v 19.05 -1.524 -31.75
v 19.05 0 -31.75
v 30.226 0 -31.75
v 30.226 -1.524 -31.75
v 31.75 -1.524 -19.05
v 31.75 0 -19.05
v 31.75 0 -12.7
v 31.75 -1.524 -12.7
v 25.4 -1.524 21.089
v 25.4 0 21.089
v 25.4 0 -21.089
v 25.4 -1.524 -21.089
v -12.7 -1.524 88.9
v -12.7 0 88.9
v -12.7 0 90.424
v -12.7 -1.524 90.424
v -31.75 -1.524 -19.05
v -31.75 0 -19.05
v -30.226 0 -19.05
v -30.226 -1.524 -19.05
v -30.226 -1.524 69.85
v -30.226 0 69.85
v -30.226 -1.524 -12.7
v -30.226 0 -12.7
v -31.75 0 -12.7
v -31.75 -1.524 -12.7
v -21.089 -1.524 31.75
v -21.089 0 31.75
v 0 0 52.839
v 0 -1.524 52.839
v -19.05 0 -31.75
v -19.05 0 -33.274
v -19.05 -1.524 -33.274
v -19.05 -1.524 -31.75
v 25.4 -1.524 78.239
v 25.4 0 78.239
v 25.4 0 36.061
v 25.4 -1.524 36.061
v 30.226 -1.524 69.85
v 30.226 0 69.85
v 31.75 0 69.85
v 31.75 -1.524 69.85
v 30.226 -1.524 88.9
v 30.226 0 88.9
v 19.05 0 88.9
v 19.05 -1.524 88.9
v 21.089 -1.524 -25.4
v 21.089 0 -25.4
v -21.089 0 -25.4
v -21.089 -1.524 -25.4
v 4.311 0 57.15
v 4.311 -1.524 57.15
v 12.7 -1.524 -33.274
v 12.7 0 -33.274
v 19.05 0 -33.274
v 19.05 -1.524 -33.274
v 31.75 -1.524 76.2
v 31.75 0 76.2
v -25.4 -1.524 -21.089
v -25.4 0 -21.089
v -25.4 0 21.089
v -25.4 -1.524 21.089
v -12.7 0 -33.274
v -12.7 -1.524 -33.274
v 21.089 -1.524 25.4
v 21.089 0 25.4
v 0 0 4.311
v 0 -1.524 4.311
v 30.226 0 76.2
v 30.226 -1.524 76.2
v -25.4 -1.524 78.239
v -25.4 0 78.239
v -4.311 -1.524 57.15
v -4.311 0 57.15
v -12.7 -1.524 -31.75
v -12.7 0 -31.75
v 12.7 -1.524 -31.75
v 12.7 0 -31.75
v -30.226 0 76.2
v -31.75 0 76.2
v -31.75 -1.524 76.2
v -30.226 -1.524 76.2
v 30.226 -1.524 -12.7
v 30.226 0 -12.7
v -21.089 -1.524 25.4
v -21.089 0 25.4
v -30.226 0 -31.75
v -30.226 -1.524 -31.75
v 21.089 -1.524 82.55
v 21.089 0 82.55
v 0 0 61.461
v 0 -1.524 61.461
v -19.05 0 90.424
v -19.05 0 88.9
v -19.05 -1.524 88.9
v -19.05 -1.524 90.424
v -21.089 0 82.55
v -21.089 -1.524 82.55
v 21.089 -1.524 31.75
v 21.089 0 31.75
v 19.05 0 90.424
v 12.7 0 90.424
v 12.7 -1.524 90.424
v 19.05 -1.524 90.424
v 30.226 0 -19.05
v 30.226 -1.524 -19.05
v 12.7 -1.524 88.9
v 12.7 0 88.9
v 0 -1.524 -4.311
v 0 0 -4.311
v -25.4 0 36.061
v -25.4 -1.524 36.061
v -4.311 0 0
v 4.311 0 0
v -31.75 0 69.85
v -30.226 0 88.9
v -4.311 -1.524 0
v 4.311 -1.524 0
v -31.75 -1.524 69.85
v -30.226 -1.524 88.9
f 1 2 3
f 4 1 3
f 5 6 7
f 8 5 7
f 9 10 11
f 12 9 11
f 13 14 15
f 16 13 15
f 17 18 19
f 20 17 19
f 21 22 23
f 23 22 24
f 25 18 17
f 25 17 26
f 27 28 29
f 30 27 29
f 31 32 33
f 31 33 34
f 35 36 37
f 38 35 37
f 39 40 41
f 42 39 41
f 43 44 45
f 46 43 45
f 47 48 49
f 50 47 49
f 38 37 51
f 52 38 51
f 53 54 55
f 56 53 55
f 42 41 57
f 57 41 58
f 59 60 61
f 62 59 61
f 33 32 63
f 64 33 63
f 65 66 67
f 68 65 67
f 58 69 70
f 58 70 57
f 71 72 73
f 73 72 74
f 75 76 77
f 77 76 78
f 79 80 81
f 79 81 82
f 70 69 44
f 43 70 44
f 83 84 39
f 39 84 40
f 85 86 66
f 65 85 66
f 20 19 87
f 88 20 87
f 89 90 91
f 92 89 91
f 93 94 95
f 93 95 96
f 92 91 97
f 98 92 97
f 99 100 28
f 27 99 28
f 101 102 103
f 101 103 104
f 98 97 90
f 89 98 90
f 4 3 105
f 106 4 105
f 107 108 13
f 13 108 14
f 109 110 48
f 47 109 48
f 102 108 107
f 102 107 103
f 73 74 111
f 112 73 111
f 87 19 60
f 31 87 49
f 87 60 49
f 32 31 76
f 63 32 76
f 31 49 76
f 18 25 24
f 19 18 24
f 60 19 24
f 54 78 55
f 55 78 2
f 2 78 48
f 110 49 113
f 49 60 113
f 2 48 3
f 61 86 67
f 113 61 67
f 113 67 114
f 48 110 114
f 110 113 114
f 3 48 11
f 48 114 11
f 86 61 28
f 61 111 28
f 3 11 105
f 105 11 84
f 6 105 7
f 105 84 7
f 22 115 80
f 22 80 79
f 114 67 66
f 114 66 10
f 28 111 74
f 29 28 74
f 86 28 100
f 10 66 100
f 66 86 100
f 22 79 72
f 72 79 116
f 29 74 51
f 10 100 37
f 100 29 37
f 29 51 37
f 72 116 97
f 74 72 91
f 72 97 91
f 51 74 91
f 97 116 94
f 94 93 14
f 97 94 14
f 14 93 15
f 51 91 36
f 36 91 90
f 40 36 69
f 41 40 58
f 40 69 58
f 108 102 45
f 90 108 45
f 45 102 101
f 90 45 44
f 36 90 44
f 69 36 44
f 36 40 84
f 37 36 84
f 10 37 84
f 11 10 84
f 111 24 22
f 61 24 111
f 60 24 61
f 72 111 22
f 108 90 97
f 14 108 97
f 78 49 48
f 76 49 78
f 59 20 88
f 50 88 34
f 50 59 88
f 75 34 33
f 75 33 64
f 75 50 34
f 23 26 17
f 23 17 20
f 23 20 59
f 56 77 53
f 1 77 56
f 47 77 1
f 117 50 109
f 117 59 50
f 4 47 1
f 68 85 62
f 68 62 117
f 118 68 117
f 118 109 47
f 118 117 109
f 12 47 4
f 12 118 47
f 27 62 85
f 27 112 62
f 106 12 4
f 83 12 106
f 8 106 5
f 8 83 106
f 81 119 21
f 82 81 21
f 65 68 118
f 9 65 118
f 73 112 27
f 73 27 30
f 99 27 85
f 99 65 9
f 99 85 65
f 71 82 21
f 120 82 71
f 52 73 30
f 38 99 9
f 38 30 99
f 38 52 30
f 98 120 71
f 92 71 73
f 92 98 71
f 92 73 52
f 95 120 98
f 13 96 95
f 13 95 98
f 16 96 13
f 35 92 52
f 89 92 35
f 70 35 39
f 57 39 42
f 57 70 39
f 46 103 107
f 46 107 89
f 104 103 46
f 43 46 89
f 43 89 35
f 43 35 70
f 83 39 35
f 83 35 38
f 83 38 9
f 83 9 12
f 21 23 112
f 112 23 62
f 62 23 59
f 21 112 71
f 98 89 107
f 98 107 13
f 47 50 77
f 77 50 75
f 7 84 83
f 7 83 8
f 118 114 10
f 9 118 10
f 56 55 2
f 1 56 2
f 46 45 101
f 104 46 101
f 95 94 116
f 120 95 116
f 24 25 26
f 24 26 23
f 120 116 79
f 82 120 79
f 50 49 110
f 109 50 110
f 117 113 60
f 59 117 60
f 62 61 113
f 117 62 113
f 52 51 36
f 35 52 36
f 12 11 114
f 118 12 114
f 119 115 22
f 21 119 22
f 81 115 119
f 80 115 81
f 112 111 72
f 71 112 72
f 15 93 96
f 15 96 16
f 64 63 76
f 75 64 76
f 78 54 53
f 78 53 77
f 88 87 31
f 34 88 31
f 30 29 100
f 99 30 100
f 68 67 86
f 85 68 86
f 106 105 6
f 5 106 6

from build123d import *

# Parameters (mm, degrees)
F0_W     = 1.524
F0_H     = 6.35
F0_W_2   = 6.35
F0_H_2   = 1.524
F1_DEPTH = 1.524


with BuildPart() as f1:
    # F0 (on Front) → F1 (new body)
    with BuildSketch(Plane.XZ):
        Polygon((30.226, 19.05), (30.226, 25.4), (25.4, 25.4), (25.4, 21.0894770619), (25.4, -21.0894770619), (25.4, -25.4), (21.0894770619, -25.4), (-21.0894770619, -25.4), (-25.4, -25.4), (-25.4, -21.0894770619), (-25.4, 21.0894770619), (-25.4, 25.4), (-30.226, 25.4), (-30.226, 19.05), (-30.226, 12.7), (-30.226, -12.7), (-30.226, -19.05), (-30.226, -31.75), (-19.05, -31.75), (-12.7, -31.75), (12.7, -31.75), (19.05, -31.75), (30.226, -31.75), (30.226, -19.05), (30.226, -12.7), (30.226, 12.7), align=None)
        with Locations((-30.988, -15.875)):
            Rectangle(F0_W, F0_H)
        with Locations((-15.875, -32.512)):
            Rectangle(F0_W_2, F0_H_2)
        with Locations((15.875, -32.512)):
            Rectangle(F0_W_2, F0_H_2)
        Polygon((25.4, -25.4), (25.4, -21.0894770619), (4.3105229381, 0), (0, -4.3105229381), (21.0894770619, -25.4), align=None)
        Polygon((4.3105229381, 0), (0, 4.3105229381), (-4.3105229381, 0), (0, -4.3105229381), align=None)
        Polygon((25.4, 21.0894770619), (25.4, 25.4), (21.0894770619, 25.4), (0, 4.3105229381), (4.3105229381, 0), align=None)
        Polygon((-4.3105229381, 0), (0, 4.3105229381), (-21.0894770619, 25.4), (-25.4, 25.4), (-25.4, 21.0894770619), align=None)
        Polygon((0, -4.3105229381), (-4.3105229381, 0), (-25.4, -21.0894770619), (-25.4, -25.4), (-21.0894770619, -25.4), align=None)
        Polygon((-19.05, 31.75), (-21.0894770619, 31.75), (-25.4, 31.75), (-30.226, 31.75), (-30.226, 25.4), (-25.4, 25.4), (-21.0894770619, 25.4), (-19.05, 25.4), (-19.05, 26.924), (-12.7, 26.924), (-12.7, 25.4), (0, 25.4), (0, 31.75), (-12.7, 31.75), (-12.7, 30.226), (-19.05, 30.226), align=None)
        with Locations((-15.875, 26.162)):
            Rectangle(F0_W_2, F0_H_2)
        Polygon((30.226, 25.4), (30.226, 31.75), (25.4, 31.75), (21.0894770619, 31.75), (19.05, 31.75), (19.05, 30.226), (12.7, 30.226), (12.7, 31.75), (0, 31.75), (0, 25.4), (12.7, 25.4), (12.7, 26.924), (19.05, 26.924), (19.05, 25.4), (21.0894770619, 25.4), (25.4, 25.4), align=None)
        with Locations((15.875, 26.162)):
            Rectangle(F0_W_2, F0_H_2)
        with Locations((15.875, 30.988)):
            Rectangle(F0_W_2, F0_H_2)
        Polygon((25.4, 31.75), (30.226, 31.75), (30.226, 38.1), (30.226, 44.45), (30.226, 69.85), (30.226, 76.2), (30.226, 88.9), (19.05, 88.9), (12.7, 88.9), (-12.7, 88.9), (-19.05, 88.9), (-30.226, 88.9), (-30.226, 76.2), (-30.226, 69.85), (-30.226, 44.45), (-30.226, 38.1), (-30.226, 31.75), (-25.4, 31.75), (-25.4, 36.0605229381), (-25.4, 78.2394770619), (-25.4, 82.55), (-21.0894770619, 82.55), (21.0894770619, 82.55), (25.4, 82.55), (25.4, 78.2394770619), (25.4, 36.0605229381), align=None)
        Polygon((-21.0894770619, 31.75), (0, 52.8394770619), (-4.3105229381, 57.15), (-25.4, 36.0605229381), (-25.4, 31.75), align=None)
        Polygon((-4.3105229381, 57.15), (0, 52.8394770619), (4.3105229381, 57.15), (0, 61.4605229381), align=None)
        Polygon((0, 61.4605229381), (4.3105229381, 57.15), (25.4, 78.2394770619), (25.4, 82.55), (21.0894770619, 82.55), align=None)
        Polygon((21.0894770619, 31.75), (25.4, 31.75), (25.4, 36.0605229381), (4.3105229381, 57.15), (0, 52.8394770619), align=None)
        Polygon((-25.4, 78.2394770619), (-4.3105229381, 57.15), (0, 61.4605229381), (-21.0894770619, 82.55), (-25.4, 82.55), align=None)
        with Locations((15.875, 89.662)):
            Rectangle(F0_W_2, F0_H_2)
        with Locations((-15.875, 89.662)):
            Rectangle(F0_W_2, F0_H_2)
        with Locations((-30.988, 73.025)):
            Rectangle(F0_W, F0_H)
        with Locations((30.988, 73.025)):
            Rectangle(F0_W, F0_H)
        with Locations((30.988, -15.875)):
            Rectangle(F0_W, F0_H)
        with Locations((-15.875, 30.988)):
            Rectangle(F0_W_2, F0_H_2)
    extrude(amount=F1_DEPTH)


solid = f1.part
